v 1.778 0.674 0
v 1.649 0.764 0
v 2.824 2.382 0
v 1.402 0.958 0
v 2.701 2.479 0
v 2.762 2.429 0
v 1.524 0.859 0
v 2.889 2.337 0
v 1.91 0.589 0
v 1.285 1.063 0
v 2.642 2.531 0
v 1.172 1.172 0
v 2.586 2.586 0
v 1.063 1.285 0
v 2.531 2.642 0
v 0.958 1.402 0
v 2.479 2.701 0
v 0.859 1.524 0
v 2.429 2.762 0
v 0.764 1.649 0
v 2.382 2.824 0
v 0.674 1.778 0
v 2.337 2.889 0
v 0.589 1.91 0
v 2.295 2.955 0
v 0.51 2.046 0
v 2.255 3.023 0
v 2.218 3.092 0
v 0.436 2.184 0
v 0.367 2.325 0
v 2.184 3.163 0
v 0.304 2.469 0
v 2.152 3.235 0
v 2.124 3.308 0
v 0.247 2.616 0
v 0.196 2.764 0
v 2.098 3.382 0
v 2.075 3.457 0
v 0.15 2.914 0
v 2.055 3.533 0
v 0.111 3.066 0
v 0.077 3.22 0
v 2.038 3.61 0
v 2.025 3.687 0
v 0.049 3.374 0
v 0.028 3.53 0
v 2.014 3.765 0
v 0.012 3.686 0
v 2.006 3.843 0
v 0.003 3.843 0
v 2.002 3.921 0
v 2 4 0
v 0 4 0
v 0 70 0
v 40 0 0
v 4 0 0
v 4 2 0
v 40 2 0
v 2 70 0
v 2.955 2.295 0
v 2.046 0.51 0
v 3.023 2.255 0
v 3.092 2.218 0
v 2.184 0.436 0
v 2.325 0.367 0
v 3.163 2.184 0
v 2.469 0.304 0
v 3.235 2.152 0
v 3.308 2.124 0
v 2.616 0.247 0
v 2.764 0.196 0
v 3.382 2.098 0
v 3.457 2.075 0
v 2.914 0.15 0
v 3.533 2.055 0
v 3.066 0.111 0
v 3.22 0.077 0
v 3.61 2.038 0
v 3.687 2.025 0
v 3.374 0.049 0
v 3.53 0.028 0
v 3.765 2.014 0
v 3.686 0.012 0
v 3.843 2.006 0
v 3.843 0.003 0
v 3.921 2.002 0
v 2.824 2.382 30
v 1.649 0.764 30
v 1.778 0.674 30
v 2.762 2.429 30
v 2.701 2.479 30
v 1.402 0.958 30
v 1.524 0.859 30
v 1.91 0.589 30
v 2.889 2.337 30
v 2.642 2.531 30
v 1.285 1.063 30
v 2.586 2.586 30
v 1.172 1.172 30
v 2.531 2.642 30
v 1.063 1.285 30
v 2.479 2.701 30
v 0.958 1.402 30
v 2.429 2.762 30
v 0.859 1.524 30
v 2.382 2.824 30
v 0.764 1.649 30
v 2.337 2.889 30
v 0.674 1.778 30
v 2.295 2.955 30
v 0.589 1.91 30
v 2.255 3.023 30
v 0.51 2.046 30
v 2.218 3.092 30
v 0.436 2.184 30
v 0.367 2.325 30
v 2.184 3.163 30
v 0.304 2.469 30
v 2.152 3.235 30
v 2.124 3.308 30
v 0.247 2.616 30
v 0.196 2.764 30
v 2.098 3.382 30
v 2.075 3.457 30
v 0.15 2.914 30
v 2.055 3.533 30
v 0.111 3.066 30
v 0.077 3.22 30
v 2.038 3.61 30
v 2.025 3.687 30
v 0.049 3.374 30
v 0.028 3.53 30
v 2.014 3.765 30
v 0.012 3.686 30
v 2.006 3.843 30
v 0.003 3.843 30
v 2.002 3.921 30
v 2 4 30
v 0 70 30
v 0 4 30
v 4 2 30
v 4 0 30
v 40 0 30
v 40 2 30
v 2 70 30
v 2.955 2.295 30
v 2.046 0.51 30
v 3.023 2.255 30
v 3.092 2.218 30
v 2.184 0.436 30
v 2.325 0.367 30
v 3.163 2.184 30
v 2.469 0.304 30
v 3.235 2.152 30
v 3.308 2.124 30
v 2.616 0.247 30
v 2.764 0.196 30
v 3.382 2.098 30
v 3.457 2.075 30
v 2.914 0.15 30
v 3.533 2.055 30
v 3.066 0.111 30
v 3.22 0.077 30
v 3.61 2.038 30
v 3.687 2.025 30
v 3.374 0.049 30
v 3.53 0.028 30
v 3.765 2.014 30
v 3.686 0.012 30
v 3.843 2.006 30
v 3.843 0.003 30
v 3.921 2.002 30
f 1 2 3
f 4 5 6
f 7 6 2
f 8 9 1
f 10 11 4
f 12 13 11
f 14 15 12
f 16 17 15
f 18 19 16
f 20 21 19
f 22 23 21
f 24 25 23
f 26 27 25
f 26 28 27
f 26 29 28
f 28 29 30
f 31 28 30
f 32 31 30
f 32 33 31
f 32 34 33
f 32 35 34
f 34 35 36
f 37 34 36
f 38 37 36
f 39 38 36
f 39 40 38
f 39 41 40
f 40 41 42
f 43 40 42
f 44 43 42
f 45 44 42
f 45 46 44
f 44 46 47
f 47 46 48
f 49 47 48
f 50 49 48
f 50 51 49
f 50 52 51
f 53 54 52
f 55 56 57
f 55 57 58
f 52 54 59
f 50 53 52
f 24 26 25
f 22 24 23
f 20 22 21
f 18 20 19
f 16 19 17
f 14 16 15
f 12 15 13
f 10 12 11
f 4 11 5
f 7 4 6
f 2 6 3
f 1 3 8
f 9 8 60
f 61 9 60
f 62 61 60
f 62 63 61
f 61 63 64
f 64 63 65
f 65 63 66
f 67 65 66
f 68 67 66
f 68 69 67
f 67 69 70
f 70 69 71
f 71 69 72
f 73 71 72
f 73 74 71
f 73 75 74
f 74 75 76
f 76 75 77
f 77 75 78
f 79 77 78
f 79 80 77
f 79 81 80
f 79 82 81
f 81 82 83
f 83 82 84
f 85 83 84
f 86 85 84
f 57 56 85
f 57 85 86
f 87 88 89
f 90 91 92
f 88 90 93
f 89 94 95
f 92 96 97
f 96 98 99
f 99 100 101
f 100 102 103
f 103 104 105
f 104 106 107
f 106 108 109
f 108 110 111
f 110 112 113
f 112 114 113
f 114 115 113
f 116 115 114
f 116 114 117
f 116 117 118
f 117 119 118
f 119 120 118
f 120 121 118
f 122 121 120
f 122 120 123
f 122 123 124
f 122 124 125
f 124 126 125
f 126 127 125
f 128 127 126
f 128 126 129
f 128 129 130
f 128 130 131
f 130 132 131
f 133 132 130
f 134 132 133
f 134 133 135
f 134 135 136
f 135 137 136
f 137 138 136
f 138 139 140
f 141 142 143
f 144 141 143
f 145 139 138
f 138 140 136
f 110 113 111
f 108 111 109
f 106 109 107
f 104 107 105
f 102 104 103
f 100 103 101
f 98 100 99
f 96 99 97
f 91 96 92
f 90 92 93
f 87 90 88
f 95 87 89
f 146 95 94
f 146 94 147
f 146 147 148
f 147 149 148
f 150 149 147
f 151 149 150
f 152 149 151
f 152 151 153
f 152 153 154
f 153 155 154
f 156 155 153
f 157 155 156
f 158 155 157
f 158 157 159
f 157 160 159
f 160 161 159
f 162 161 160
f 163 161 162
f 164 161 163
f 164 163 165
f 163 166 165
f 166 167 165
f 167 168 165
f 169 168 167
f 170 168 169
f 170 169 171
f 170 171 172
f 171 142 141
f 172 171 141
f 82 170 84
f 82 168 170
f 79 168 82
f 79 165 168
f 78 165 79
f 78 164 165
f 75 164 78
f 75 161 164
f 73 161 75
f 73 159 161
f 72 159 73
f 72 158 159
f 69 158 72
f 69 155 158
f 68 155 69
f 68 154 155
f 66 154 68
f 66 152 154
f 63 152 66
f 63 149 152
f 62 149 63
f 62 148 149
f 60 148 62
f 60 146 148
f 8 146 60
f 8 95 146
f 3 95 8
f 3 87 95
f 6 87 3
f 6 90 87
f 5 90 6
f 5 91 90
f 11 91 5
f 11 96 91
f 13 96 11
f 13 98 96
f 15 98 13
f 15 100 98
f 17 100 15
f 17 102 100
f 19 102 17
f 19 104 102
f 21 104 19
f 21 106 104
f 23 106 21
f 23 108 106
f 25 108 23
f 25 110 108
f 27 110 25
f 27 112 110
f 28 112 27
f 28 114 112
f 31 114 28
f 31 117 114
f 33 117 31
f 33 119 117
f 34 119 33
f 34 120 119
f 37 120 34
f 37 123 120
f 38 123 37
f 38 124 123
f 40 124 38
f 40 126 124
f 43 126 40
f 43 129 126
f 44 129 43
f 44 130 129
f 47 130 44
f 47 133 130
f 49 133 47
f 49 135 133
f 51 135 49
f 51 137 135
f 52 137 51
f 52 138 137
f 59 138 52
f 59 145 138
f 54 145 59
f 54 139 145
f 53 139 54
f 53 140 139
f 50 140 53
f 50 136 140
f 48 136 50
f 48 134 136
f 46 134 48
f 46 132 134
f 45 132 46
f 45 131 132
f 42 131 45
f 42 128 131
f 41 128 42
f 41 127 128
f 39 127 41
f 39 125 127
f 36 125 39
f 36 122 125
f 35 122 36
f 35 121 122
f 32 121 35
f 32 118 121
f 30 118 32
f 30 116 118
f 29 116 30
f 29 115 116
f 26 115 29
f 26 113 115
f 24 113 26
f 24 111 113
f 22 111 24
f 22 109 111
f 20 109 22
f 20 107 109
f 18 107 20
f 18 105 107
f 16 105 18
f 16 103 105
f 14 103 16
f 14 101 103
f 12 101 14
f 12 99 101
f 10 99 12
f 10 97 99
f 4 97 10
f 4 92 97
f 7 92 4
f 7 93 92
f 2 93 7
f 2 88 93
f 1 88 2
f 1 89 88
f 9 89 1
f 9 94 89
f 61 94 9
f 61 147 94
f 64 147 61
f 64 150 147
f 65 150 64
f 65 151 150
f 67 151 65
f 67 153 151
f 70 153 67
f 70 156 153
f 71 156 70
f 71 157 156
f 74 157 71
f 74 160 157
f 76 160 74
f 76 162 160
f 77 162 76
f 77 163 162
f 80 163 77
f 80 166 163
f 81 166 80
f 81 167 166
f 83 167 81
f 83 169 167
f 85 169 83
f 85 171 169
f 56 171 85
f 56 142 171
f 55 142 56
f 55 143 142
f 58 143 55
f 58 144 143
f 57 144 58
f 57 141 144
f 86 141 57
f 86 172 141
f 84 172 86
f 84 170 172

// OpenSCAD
// ============================================================================
// Constant-gauge sheet-metal L-bracket
// Single 90-deg bend, formed (bent) geometry rendered to true gauge.
// ----------------------------------------------------------------------------
//   Outside flange A : 70 mm   (long leg, vertical)
//   Outside flange B : 40 mm   (short leg, horizontal)
//   Width            : 30 mm
//   Material gauge   : 2.0 mm   (constant everywhere, incl. through the bend)
//   Inside bend rad  : 2.0 mm   -> outside bend rad = ri + t = 4.0 mm
//   k-factor         : 0.45     (neutral-axis bend allowance)
// ----------------------------------------------------------------------------
//   Flat (developed) length is computed on the NEUTRAL axis:
//     legA = A_out - (ri + t)            (outside setback for 90deg = ri+t)
//     legB = B_out - (ri + t)
//     BA   = (pi/2) * (ri + k*t)         (90-deg bend allowance, neutral arc)
//     flat = legA + legB + BA
// ============================================================================

// ---- Parameters -----------------------------------------------------------
A_out   = 70.0;          // outside length, flange A (vertical leg)
B_out   = 40.0;          // outside length, flange B (horizontal leg)
width   = 30.0;          // bracket width (extrusion depth)
t       = 2.0;           // sheet thickness (constant gauge)
ri      = 2.0;           // inside bend radius
kf      = 0.45;          // k-factor (neutral axis fraction)

// ---- Derived geometry -----------------------------------------------------
ro      = ri + t;                      // outside bend radius = 4.0
r_n     = ri + kf * t;                 // neutral-axis radius  = 2.9
BA      = (PI/2) * r_n;                // 90-deg bend allowance (neutral)
legA    = A_out - ro;                  // straight flat of flange A = 66.0
legB    = B_out - ro;                  // straight flat of flange B = 36.0
flat_len = legA + legB + BA;           // developed blank length

$fn     = 160;                         // arc smoothness

// ---- BOM / manifest -------------------------------------------------------
echo(str("MAKERBENCH-SHEETMETAL: {",
         "\"thickness_mm\": ",   t,
         ", \"bend_radius_mm\": ", ri,
         ", \"flat_length_mm\": ", flat_len,
         "}"));
// BOM: 1x sheet-metal blank, 2.0 mm gauge, 30 mm x 106.56 mm developed,
//      one 90-deg air-bend, inside radius 2.0 mm.

// ---- Formed cross-section (X = horizontal leg, Y = vertical leg) ----------
// Inside concave corner and outside corner share bend center at (ro, ro).
// Both flange inner/outer faces are exactly t apart -> constant gauge.
module section2d() {
    union() {
        // Flange B : horizontal leg, gauge in y[0..t], spans x[ro..B_out]
        translate([ro, 0]) square([B_out - ro, t]);

        // Flange A : vertical leg, gauge in x[0..t], spans y[ro..A_out]
        translate([0, ro]) square([t, A_out - ro]);

        // Bend: annular sector (ri..ro) over the 180-270 deg quadrant,
        // i.e. the lower-left quarter of a circle centered at (ro, ro).
        intersection() {
            translate([ro, ro])
                difference() {
                    circle(r = ro);
                    circle(r = ri);
                }
            square([ro, ro]);   // clips to x[0..ro], y[0..ro]
        }
    }
}

// ---- Extrude to width -----------------------------------------------------
linear_extrude(height = width) section2d();
